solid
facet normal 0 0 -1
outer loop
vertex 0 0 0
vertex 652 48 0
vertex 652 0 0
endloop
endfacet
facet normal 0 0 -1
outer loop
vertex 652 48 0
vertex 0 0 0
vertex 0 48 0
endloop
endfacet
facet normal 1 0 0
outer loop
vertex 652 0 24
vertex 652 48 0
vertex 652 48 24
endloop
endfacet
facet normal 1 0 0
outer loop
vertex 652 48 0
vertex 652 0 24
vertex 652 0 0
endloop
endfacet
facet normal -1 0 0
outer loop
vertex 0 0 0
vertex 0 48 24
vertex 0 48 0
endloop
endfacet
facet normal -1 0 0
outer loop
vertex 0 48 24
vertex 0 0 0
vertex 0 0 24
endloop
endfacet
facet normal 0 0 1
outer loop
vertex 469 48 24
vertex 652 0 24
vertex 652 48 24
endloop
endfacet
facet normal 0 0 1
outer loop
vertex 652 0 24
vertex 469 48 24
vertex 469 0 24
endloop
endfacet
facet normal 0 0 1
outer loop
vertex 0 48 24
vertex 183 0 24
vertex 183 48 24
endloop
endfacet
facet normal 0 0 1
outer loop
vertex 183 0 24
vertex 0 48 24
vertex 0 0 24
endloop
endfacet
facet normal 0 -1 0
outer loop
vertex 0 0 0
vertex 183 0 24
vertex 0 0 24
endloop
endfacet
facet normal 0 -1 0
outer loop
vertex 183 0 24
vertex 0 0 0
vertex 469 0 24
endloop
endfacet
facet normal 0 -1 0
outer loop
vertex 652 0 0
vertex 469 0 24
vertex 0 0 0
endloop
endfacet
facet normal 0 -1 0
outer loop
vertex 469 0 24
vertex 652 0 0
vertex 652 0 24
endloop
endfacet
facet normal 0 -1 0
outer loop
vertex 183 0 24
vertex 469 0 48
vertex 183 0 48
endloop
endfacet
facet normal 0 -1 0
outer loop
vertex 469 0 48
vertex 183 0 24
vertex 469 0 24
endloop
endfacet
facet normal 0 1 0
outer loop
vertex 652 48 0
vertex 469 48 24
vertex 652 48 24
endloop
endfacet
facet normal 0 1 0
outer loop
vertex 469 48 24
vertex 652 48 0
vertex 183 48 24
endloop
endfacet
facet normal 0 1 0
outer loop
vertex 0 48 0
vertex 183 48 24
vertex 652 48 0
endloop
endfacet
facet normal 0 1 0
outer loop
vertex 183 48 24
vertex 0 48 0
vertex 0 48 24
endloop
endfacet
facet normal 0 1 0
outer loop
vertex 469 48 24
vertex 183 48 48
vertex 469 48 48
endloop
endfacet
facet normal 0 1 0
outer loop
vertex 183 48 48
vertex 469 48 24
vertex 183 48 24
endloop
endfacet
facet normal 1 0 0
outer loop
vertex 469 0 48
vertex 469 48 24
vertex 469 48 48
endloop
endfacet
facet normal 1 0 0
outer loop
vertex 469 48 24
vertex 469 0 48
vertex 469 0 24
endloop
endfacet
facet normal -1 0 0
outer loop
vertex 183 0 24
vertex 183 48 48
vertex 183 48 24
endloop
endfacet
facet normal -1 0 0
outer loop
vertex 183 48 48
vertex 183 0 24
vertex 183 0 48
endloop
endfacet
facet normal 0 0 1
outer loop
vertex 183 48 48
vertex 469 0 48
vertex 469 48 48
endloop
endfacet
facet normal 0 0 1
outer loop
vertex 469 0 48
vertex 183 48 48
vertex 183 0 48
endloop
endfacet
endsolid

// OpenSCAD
scale = 32;

firWidth = (3 / 4) * scale;
firHeight = (3 / 2) * scale;
prismHyp = sqrt(2 * firWidth * firWidth);
miniPrismSide = prismHyp - firWidth;
miniPrismHyp = firWidth;

size = 6 * scale;
length = 20.375 * scale;

module strip(firLen)
{
    translate([0, 0, firWidth])
    {
        rotate([0,90,0])
        {
            cube([firWidth,firHeight,firLen]);
        }
    }
}

// 45 degree angle on 1 end
module strip45(firLen)
{
    points = [
    [  0,  0,  0 ],  //0
    [  0,  firHeight,  0 ],  //1
    [  0,  0,  firWidth ],  //2
    [  0,  firHeight,  firWidth ],  //3
    [  firLen - firWidth,  0,  firWidth ],  //4
    [  firLen - firWidth,  firHeight,  firWidth ],  //5
    [  firLen,  0,  0 ],  //6
    [  firLen,  firHeight,  0 ]]; //7
  
    faces = [
    [0,1,3,2], //back
    [0,1,7,6],  // bottom
    [4,2,3,5], // top
    [6,4,5,7],  // front
    [0,2,4,6],  // right
    [7,1,3,5]];  // left
  
    polyhedron( points, faces );
}

// 45 degree angle on both ends
module strip45x2(firLen)
{
    points = [
    [  0,  0,  0 ],  //0
    [firWidth,0,firWidth], //1
    [firWidth,firHeight,firWidth], //2
    [0,firHeight,0], //3
    [  firLen - miniPrismSide,  0, 0 ],  //4
    [  firLen,  0, miniPrismSide ],  //5
    [  firLen - miniPrismSide,  firHeight, 0 ],  //6
    [  firLen - sqrt(2 * (prismHyp - firWidth) *(prismHyp - firWidth)), firHeight, firWidth ], //7
    [  firLen, firHeight, miniPrismSide  ], //8
    [  firLen - sqrt(2 * (prismHyp - firWidth) *(prismHyp - firWidth)), 0, firWidth]  ]; //9
  
    faces = [
    [0,1,2,3], //back
    [0,3,6,4],  // bottom
    [1,2,7,9], // top
    [5,9,7,8],  // front
    [4,5,8,6],  //front bezel
    [0,1,9,5,4],  // right
    [6,3,2,7,8]];  // left
  
    polyhedron( points, faces );
}

module corner45(sideLen)
{
    strip45(sideLen);
    translate([0, (firHeight / 2), 0])
    {
        rotate([0,180,180])
        {
            color("black") text(str("   ", sideLen / scale ," inches"));
        }
    }
    translate([0,firHeight,firWidth])
    {
        rotate([0,-90,180])
        {
            strip45(sideLen - firWidth);
            translate([0, (firHeight / 2), 0])
            {
                rotate([0,180,180])
                {
                    color("black") text(str("   ", (sideLen - firWidth) / scale ," inches"));
                }
            }
        }
    }
}

module invu45(sideLen,longLen)
{
    strip(longLen);
    sizep = sqrt(2 * firWidth * firWidth);
    hyp = sqrt(2 * sizep * sizep);
    translate([sideLen - firWidth + 15, 0, firWidth])
    {
        topStripLen = longLen - (sideLen * 2) + (2 * firWidth) - 30;
        tsBL = round((topStripLen / scale) - 0.5);
        thirty2nds = round((topStripLen - (tsBL * scale)) - 0.5); 
        strip(topStripLen);
        color("black") text(str("   ", topStripLen, " ", thirty2nds, "/32 inches"));
    }
    translate([0, (firHeight / 2), 0])
    {
        longBL = round((longLen / scale) - 0.5);
        thirty2nds = round((longLen - (longBL * scale)) - 0.5);
        rotate([0,180,180])
        {
            color("black") text(str("   ", longBL, " ", thirty2nds, "/32 inches"));
        }
    }
    translate([0,firHeight,firWidth])
    {
        rotate([0,-90,180])
        {
            strip45(sideLen - firWidth);
            translate([0, (firHeight / 2), 0])
            {
                rotate([0,180,180])
                {
                    color("black") text(str("   ", (sideLen - firWidth) / scale ," inches"));
                }
            }
        }
    }
    translate([longLen,0,firWidth])
    {
    rotate([0,-90,0])
        {
            strip45(sideLen);
            translate([0, (firHeight / 2), 0])
            {
                rotate([0,180,180])
                {
                    color("black") text(str("   ", (sideLen - firWidth) / scale ," inches"));
                }
            }
        }
    }
}

//corner45(size);
invu45(size,length);
smallSizep = sqrt(2 * firWidth * firWidth);
smallHyp = sqrt(2 * smallSizep * smallSizep);        
translate([0,firHeight,size + sqrt(2 * firWidth * firWidth)])
{
    rotate([180,45,0])
    {
        sizep = size + sqrt(2 * firWidth * firWidth);
        hyp = sqrt(2 * sizep * sizep);
        bracketLen = hyp - prismHyp - miniPrismHyp;
        truncBL = round((bracketLen / scale) - 0.5);
        thirty2nds = round((bracketLen - (truncBL * scale)) - 0.5); 
        strip45x2(bracketLen);
        translate([0,20,0])
        {
            rotate([180,0,0])
            {
                color("black") text(str("   ", truncBL, " ", thirty2nds, "/32 inches"));
            }
        }
    }
}
translate([length,0,size + sqrt(2 * firWidth * firWidth)])
{
    rotate([0,135,0])
    {
        sizep = size + sqrt(2 * firWidth * firWidth);
        hyp = sqrt(2 * sizep * sizep);
        bracketLen = hyp - smallHyp;
        truncBL = round((bracketLen / scale) - 0.5);
        thirty2nds = round((bracketLen - (truncBL * scale)) - 0.5); 
        strip45x2(hyp - smallHyp);
        translate([0,20,0])
        {
            rotate([180,0,0])
            {
                color("black") text(str("   ", truncBL, " ", thirty2nds, "/32 inches"));
            }
        }
    }
}
